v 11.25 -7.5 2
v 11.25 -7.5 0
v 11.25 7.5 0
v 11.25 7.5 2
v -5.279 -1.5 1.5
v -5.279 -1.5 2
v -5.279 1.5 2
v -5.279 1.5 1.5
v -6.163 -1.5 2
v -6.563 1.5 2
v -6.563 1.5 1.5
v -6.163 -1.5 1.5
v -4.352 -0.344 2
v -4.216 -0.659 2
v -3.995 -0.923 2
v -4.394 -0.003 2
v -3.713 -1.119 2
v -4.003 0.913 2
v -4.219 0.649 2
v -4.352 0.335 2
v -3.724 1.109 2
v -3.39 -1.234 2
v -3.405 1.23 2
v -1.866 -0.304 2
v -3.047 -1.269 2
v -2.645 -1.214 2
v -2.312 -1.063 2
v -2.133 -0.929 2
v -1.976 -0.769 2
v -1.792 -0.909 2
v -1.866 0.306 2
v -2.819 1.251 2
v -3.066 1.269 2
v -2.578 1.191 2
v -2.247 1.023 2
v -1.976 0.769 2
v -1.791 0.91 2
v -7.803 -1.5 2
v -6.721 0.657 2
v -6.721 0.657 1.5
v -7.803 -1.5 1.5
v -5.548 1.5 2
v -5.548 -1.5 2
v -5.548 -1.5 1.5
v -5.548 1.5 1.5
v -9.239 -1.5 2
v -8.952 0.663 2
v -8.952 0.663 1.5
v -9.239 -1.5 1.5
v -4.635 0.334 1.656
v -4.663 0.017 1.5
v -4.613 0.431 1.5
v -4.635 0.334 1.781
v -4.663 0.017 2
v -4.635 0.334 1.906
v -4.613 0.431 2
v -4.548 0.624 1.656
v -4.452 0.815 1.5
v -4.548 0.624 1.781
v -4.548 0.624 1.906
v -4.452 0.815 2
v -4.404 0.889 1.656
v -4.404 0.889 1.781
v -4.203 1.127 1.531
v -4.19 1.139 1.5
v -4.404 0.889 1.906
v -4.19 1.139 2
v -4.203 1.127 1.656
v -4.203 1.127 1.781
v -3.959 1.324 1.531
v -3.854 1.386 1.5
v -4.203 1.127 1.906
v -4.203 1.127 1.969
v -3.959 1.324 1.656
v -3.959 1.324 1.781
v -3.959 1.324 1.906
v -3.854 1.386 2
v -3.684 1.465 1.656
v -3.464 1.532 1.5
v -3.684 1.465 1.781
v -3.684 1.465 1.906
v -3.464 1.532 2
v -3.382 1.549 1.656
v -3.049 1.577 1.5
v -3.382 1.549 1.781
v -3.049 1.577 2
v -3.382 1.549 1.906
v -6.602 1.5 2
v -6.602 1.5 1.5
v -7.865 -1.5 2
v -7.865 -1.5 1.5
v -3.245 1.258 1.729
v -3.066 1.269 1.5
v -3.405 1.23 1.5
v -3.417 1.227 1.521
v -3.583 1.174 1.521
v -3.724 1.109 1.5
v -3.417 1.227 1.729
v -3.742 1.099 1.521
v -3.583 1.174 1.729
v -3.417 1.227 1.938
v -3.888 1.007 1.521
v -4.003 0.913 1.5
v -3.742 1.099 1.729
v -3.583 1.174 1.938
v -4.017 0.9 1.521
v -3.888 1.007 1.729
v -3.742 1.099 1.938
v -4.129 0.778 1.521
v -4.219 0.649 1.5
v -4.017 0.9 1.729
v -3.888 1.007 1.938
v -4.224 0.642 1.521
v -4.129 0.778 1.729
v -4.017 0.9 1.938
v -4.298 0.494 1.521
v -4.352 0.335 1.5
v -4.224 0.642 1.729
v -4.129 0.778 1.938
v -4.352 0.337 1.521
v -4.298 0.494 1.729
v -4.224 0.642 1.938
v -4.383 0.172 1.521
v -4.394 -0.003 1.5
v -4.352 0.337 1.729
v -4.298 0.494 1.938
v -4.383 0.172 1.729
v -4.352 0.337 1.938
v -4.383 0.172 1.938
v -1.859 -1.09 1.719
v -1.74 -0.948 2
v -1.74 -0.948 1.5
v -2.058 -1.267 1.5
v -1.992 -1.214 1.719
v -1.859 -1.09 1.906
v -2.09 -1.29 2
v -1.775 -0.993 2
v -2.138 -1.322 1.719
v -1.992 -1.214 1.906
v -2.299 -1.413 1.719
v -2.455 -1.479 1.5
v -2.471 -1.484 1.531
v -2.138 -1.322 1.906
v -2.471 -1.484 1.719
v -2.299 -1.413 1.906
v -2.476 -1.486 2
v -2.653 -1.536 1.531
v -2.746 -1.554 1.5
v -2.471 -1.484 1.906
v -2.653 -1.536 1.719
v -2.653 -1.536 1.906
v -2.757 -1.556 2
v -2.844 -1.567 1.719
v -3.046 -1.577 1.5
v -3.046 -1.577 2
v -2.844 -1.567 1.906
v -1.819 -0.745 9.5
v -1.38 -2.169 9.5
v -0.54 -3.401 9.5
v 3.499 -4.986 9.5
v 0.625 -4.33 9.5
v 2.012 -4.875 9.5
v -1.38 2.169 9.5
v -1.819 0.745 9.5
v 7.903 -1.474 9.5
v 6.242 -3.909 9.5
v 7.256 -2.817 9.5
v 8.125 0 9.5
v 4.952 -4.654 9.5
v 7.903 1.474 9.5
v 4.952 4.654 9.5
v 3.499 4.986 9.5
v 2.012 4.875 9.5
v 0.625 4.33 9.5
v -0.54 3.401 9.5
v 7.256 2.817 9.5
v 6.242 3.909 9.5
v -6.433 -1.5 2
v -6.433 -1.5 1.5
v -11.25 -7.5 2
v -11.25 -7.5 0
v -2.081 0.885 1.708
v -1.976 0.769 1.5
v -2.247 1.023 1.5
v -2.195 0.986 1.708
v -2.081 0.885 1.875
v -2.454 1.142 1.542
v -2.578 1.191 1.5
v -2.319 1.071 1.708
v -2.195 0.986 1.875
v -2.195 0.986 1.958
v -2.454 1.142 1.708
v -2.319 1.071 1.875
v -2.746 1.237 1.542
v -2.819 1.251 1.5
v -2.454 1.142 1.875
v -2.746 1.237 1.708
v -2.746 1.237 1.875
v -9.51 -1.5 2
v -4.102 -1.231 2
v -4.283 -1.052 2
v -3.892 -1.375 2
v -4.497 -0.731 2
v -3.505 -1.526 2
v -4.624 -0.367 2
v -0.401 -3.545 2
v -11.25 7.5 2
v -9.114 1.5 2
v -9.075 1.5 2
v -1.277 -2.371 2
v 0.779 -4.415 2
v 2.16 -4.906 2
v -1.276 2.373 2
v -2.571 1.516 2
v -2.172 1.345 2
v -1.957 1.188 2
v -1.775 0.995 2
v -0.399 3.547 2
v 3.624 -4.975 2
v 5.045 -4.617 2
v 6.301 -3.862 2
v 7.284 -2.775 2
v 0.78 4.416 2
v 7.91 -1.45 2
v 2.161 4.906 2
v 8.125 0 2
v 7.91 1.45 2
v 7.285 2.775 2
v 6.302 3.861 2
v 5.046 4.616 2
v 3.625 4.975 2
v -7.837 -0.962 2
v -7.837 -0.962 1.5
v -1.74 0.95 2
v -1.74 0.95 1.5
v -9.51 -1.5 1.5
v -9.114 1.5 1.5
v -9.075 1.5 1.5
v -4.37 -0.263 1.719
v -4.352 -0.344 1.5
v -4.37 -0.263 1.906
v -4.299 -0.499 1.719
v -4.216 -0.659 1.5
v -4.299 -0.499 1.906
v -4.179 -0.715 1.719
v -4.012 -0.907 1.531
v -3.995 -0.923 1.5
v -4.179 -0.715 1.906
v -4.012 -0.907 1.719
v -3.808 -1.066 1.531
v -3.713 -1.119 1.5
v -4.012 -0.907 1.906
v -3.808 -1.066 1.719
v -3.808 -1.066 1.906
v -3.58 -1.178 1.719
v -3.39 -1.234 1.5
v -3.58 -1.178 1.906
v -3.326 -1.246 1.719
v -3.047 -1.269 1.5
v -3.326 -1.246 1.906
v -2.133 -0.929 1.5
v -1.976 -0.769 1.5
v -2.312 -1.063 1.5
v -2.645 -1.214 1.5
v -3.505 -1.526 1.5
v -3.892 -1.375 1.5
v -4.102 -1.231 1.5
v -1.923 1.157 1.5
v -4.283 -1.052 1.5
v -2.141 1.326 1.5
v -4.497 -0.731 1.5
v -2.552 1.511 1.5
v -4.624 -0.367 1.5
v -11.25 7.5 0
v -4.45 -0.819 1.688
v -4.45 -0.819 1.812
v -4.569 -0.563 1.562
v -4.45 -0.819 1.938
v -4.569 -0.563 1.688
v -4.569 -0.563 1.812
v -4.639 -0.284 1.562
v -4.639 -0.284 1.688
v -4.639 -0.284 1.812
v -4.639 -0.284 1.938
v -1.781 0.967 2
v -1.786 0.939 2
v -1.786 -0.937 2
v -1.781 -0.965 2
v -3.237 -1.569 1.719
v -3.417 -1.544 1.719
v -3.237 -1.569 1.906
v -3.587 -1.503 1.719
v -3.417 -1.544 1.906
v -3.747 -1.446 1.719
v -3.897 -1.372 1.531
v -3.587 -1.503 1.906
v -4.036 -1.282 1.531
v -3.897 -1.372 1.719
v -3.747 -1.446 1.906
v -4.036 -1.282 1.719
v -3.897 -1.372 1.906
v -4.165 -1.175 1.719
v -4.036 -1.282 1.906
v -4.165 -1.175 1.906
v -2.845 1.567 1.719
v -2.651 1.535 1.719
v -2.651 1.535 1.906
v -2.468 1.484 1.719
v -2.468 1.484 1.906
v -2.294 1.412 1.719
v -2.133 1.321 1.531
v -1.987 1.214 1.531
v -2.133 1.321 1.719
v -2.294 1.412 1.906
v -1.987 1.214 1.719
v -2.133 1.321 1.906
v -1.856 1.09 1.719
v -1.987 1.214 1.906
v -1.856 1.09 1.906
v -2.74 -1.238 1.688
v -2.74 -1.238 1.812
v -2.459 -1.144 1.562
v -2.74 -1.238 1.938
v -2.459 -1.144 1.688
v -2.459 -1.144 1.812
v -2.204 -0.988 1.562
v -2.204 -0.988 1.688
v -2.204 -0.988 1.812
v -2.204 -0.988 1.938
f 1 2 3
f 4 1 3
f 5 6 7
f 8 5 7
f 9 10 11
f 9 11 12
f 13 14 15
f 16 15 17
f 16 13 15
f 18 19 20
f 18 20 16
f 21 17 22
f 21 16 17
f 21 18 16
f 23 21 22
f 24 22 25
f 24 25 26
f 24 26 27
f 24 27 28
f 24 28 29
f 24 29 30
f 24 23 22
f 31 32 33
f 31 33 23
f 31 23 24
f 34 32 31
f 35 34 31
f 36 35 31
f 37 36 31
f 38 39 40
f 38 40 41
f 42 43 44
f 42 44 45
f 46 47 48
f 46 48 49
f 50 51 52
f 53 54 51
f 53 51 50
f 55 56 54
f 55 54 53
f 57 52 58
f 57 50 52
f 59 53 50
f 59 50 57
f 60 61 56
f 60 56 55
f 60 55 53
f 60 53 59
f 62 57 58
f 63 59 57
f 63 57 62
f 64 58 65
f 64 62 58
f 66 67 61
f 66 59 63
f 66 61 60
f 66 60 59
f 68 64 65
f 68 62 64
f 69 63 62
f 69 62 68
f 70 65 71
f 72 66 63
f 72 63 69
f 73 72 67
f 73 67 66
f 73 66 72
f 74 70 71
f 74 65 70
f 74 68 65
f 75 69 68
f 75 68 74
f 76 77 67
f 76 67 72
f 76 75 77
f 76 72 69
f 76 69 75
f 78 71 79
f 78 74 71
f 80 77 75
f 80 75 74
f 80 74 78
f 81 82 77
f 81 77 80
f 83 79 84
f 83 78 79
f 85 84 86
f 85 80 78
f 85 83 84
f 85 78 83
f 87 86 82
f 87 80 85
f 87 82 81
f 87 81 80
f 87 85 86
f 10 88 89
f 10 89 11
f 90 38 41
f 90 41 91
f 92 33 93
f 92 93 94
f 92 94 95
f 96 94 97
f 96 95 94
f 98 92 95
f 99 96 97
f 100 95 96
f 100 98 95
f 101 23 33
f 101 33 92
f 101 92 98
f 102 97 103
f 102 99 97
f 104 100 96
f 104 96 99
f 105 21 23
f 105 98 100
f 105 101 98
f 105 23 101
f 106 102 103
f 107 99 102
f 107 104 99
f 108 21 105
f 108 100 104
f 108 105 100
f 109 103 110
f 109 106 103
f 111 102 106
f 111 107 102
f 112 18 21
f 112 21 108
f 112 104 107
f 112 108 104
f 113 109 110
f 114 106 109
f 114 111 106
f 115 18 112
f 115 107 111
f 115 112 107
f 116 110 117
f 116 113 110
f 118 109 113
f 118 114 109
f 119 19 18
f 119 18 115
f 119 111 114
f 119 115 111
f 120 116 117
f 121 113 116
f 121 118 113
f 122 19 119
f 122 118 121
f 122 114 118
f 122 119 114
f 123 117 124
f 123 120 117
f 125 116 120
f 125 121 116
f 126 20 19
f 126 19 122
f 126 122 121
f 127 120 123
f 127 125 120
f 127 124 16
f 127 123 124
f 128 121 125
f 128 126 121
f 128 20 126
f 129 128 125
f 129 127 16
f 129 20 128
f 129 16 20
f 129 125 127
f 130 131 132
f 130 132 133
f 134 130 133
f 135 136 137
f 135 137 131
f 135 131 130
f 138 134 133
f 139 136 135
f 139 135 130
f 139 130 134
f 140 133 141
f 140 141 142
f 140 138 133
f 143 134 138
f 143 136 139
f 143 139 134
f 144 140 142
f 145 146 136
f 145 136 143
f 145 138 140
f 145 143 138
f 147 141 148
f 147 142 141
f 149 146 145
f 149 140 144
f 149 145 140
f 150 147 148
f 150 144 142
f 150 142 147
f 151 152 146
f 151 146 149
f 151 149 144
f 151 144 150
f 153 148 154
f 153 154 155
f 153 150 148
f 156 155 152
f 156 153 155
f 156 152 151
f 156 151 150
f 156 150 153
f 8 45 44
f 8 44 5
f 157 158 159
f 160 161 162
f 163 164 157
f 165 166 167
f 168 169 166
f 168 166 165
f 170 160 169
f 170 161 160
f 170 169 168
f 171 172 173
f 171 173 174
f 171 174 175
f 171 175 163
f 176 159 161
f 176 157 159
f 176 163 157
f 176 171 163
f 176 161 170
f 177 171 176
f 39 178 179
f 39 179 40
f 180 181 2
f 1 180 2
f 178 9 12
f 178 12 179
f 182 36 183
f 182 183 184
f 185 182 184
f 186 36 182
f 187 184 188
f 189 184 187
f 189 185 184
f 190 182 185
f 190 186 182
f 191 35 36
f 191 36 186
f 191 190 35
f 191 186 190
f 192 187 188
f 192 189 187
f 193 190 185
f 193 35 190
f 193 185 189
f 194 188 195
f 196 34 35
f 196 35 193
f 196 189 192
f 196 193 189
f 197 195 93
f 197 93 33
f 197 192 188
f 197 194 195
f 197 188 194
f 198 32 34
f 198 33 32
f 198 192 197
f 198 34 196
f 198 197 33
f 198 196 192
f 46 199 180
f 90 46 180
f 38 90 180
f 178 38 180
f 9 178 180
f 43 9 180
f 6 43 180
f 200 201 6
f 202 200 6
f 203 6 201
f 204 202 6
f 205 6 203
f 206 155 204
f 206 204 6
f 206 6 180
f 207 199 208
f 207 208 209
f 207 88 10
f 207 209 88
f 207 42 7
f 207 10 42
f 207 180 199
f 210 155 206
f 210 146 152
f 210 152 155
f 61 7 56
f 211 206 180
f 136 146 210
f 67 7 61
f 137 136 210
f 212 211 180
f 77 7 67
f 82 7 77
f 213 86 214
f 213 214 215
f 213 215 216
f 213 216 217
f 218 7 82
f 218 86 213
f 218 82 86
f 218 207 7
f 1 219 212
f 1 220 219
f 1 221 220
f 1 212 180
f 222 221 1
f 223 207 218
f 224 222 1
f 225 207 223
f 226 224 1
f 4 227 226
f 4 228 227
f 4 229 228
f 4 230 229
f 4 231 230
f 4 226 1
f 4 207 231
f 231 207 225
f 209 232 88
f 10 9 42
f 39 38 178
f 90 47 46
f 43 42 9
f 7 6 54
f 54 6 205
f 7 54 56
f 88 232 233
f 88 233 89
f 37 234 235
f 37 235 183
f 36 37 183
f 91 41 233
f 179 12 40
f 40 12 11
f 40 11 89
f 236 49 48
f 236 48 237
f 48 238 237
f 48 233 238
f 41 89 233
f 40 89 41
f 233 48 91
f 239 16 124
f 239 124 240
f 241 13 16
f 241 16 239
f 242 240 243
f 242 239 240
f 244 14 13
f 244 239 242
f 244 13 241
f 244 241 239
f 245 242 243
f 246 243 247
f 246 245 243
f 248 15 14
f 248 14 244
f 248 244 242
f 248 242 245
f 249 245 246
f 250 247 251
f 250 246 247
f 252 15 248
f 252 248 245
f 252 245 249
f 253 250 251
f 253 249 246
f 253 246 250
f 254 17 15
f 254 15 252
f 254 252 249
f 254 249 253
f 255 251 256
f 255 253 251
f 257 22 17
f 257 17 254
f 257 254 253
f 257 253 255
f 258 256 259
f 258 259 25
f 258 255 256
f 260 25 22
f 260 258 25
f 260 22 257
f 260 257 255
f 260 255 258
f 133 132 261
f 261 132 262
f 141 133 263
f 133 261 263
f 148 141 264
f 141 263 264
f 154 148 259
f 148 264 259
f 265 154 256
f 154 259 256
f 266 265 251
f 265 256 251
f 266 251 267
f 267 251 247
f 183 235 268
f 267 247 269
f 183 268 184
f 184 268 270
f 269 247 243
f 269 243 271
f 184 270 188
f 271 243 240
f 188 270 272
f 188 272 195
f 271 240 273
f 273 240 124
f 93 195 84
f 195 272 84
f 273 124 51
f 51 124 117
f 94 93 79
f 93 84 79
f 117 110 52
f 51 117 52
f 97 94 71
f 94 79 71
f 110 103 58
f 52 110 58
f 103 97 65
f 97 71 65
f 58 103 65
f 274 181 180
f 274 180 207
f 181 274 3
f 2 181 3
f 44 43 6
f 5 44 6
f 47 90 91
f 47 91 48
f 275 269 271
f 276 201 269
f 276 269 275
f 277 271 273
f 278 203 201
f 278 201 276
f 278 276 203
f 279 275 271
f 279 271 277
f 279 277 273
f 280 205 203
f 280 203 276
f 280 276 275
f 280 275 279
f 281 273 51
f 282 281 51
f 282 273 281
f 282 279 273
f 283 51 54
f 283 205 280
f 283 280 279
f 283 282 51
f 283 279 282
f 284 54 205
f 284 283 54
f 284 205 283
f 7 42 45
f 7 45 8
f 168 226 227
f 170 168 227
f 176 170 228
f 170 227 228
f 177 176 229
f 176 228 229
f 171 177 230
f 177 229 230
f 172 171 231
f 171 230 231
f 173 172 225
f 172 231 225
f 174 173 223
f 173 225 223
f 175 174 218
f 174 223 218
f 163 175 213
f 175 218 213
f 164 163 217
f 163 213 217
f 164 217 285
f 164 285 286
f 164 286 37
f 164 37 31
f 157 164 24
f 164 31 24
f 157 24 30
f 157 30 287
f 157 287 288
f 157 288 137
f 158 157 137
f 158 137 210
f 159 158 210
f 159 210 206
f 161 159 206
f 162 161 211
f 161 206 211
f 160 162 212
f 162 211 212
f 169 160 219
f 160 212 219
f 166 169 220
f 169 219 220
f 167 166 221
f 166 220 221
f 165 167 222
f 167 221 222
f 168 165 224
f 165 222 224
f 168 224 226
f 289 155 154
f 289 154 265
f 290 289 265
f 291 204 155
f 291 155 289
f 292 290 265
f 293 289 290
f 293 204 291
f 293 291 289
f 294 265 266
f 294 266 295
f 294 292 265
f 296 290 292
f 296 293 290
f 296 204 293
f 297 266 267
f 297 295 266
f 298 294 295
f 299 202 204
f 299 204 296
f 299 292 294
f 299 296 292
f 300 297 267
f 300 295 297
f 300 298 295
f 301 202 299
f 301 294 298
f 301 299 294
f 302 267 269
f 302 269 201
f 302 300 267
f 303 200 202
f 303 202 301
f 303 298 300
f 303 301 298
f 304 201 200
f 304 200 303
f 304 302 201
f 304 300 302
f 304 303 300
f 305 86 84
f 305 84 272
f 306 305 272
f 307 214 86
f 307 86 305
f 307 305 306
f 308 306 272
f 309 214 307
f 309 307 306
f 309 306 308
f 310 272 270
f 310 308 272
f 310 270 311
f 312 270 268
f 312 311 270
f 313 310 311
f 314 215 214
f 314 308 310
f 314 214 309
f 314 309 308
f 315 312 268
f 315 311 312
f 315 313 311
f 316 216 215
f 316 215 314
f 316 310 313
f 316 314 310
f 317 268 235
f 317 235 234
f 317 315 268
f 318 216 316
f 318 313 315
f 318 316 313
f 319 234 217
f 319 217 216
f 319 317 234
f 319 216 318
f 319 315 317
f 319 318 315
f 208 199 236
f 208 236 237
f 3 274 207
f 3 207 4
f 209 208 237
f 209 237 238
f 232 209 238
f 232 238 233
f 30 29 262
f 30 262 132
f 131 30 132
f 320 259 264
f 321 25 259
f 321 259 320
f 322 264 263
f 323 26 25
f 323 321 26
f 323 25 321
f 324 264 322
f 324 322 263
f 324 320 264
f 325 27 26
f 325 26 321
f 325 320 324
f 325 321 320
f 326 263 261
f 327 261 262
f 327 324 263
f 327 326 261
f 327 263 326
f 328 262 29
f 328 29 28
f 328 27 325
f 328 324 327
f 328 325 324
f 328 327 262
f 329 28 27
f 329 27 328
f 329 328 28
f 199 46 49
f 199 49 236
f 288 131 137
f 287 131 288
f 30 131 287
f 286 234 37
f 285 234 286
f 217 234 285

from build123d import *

# Parameters (mm, degrees)
SKETCH1_W           = 22.5
SKETCH1_H           = 15
BOSS_EXTRUDE1_DEPTH = 2
SKETCH2_R           = 5
BOSS_EXTRUDE2_DEPTH = 7.5
SKETCH3_W           = 0.269230769
SKETCH3_H           = 3
CUT_EXTRUDE1_DEPTH  = 0.5


with BuildPart() as part:
    # Sketch1 → Boss-Extrude1 (new body)
    with BuildSketch(Plane.XY):
        Rectangle(SKETCH1_W, SKETCH1_H)
    extrude(amount=BOSS_EXTRUDE1_DEPTH)

    # Sketch2 → Boss-Extrude2 (add)
    with BuildSketch(Plane.XY.offset(2)):
        with Locations((3.125, 0)):
            Circle(SKETCH2_R)
    extrude(amount=BOSS_EXTRUDE2_DEPTH)

    # Sketch3 → Cut-Extrude1 (cut)
    with BuildSketch(Plane.XY.offset(2)):
        Polygon((-9.509615385, -1.5), (-9.113581731, 1.5), (-9.075120192, 1.5), (-7.836538462, -0.961538462), (-6.6015625, 1.5), (-6.563100962, 1.5), (-6.163461538, -1.5), (-6.432692308, -1.5), (-6.721153846, 0.656850962), (-7.803485577, -1.5), (-7.864783654, -1.5), (-8.951923077, 0.663461538), (-9.238581731, -1.5), align=None)
        with Locations((-5.413461539, 0)):
            Rectangle(SKETCH3_W, SKETCH3_H)
        with BuildLine():
            Line((-1.740384615, 0.949519231), (-1.975961538, 0.769230769))
            add(Edge.make_bspline(
                [(-1.975961538, 0.769230769), (-1.992766586, 0.789258743), (-2.026150111, 0.829044671), (-2.079857999, 0.884912852), (-2.135830836, 0.937254505), (-2.194047226, 0.986318973), (-2.255555042, 1.030390487), (-2.318864298, 1.071765718), (-2.385034051, 1.10885235), (-2.476535538, 1.153820624), (-2.596233694, 1.2007459), (-2.746914985, 1.240091526), (-2.904210212, 1.265138248), (-3.01152244, 1.26785097), (-3.066105769, 1.269230769)],
                knots=[0, 0, 0, 0, 0.757959112, 1.505699292, 2.245454638, 2.979532153, 3.711538275, 4.438200793, 5.171680507, 5.909471876, 7.393775596, 8.890124382, 10.418191784, 12, 12, 12, 12], degree=3))
            add(Edge.make_bspline(
                [(-3.066105769, 1.269230769), (-3.096177169, 1.268884516), (-3.156040877, 1.268195222), (-3.244882425, 1.259101686), (-3.332065041, 1.246320649), (-3.417532012, 1.227356086), (-3.501174547, 1.203379556), (-3.583539464, 1.174729201), (-3.663434263, 1.139282195), (-3.741964182, 1.100103687), (-3.817203506, 1.055851591), (-3.888393547, 1.007583004), (-3.955274662, 0.955838064), (-4.017899758, 0.90042283), (-4.076332857, 0.841586864), (-4.130150552, 0.778703143), (-4.179166617, 0.711972708), (-4.224352639, 0.642275502), (-4.264820696, 0.569814537), (-4.29870345, 0.49432162), (-4.32870784, 0.417089531), (-4.352450048, 0.337245679), (-4.371242491, 0.25535188), (-4.38420906, 0.171188348), (-4.393199178, 0.084930908), (-4.393885044, 0.026465783), (-4.394230769, -0.003004808)],
                knots=[0, 0, 0, 0, 1.054917814, 2.100044995, 3.131103042, 4.146048494, 5.169673617, 6.183595914, 7.203665975, 8.234915748, 9.262203917, 10.264457458, 11.251630812, 12.227803204, 13.197192746, 14.159520551, 15.12972552, 16.100847026, 17.073214652, 18.039054194, 19.002613845, 19.979014051, 20.95965708, 21.949030935, 22.966165397, 24, 24, 24, 24], degree=3))
            add(Edge.make_bspline(
                [(-4.394230769, -0.003004808), (-4.39314921, -0.047345939), (-4.391025712, -0.134403869), (-4.37212714, -0.261921535), (-4.34340849, -0.384082113), (-4.300366567, -0.500121977), (-4.247293095, -0.611471999), (-4.180229714, -0.716248159), (-4.102558396, -0.816033785), (-4.013180323, -0.908470598), (-3.915118195, -0.992910934), (-3.809905699, -1.067268575), (-3.697804881, -1.12925276), (-3.580053483, -1.180832143), (-3.455745386, -1.220480766), (-3.325104127, -1.248392872), (-3.188413845, -1.266600456), (-3.095011502, -1.268343617), (-3.047475962, -1.269230769)],
                knots=[0, 0, 0, 0, 1.029171465, 2.020641659, 2.987623507, 3.938342917, 4.889210282, 5.84687017, 6.821220943, 7.821438502, 8.827599549, 9.822697543, 10.807740252, 11.797342354, 12.80366471, 13.83203677, 14.896651826, 16, 16, 16, 16], degree=3))
            add(Edge.make_bspline(
                [(-3.047475962, -1.269230769), (-2.995102228, -1.267783244), (-2.892018192, -1.264934167), (-2.740845598, -1.240797668), (-2.596129227, -1.20166231), (-2.457861296, -1.146892662), (-2.326431599, -1.075693844), (-2.201634462, -0.989381378), (-2.083364544, -0.887134235), (-2.012246302, -0.809062982), (-1.975961538, -0.769230769)],
                knots=[0, 0, 0, 0, 1.028121516, 2.023589091, 2.998037872, 3.967518031, 4.937445131, 5.927275754, 6.942489185, 8, 8, 8, 8], degree=3))
            Line((-1.975961538, -0.769230769), (-1.740384615, -0.947716346))
            add(Edge.make_bspline(
                [(-1.740384615, -0.947716346), (-1.759342995, -0.972177876), (-1.797168946, -1.020983767), (-1.858418674, -1.08978809), (-1.922942072, -1.154505835), (-1.991218395, -1.214615224), (-2.062462216, -1.271319052), (-2.13795277, -1.323006336), (-2.216697655, -1.370398523), (-2.298430065, -1.413793029), (-2.383063162, -1.452293527), (-2.470495535, -1.485253899), (-2.560350314, -1.513646662), (-2.652631607, -1.537005464), (-2.747530827, -1.555237822), (-2.844705519, -1.567426115), (-2.944365412, -1.575776327), (-3.011600916, -1.576537398), (-3.045673077, -1.576923077)],
                knots=[0, 0, 0, 0, 0.986787822, 1.968848986, 2.935600012, 3.899624008, 4.868462664, 5.837806735, 6.815139263, 7.798259679, 8.787526145, 9.778297419, 10.776456485, 11.791383307, 12.812564526, 13.85620153, 14.913611965, 16, 16, 16, 16], degree=3))
            add(Edge.make_bspline(
                [(-3.045673077, -1.576923077), (-3.077939077, -1.576698512), (-3.141741097, -1.576254462), (-3.235940027, -1.569061176), (-3.327645382, -1.559247116), (-3.416595062, -1.544469861), (-3.503274469, -1.527031855), (-3.586897827, -1.503656492), (-3.668288007, -1.477471492), (-3.747118014, -1.446695789), (-3.823454899, -1.411967633), (-3.897052452, -1.372717725), (-3.967876822, -1.329276127), (-4.036624326, -1.282600404), (-4.102279398, -1.231191288), (-4.165410991, -1.175762744), (-4.226373113, -1.116501592), (-4.2640897, -1.07376886), (-4.283052885, -1.052283654)],
                knots=[0, 0, 0, 0, 1.114604814, 2.203992996, 3.262667896, 4.300477797, 5.318619304, 6.316056647, 7.298880507, 8.271930387, 9.238335007, 10.195173496, 11.151986948, 12.108099108, 13.064862484, 14.031167946, 15.010108607, 16, 16, 16, 16], degree=3))
            add(Edge.make_bspline(
                [(-4.283052885, -1.052283654), (-4.313426293, -1.014962635), (-4.373806416, -0.940771169), (-4.451057002, -0.820526042), (-4.517183478, -0.694981863), (-4.570648553, -0.563479067), (-4.612445181, -0.426312735), (-4.641400492, -0.283413723), (-4.660216153, -0.134915486), (-4.662367829, -0.033912525), (-4.663461538, 0.017427885)],
                knots=[0, 0, 0, 0, 0.994628077, 1.977248131, 2.950237994, 3.925870899, 4.908910175, 5.911660606, 6.938484602, 8, 8, 8, 8], degree=3))
            add(Edge.make_bspline(
                [(-4.663461538, 0.017427885), (-4.662128515, 0.071389702), (-4.659505876, 0.177556209), (-4.637223765, 0.333362454), (-4.601379083, 0.482635082), (-4.550467464, 0.625095434), (-4.48592002, 0.761492818), (-4.406182923, 0.890785279), (-4.312182515, 1.013799679), (-4.204656028, 1.128669465), (-4.08674117, 1.233703196), (-3.960467901, 1.326108514), (-3.826083375, 1.403009242), (-3.685068073, 1.467291667), (-3.53636606, 1.516701206), (-3.380294601, 1.551289652), (-3.21714696, 1.572818609), (-3.105836309, 1.575540216), (-3.049278846, 1.576923077)],
                knots=[0, 0, 0, 0, 1.032925535, 2.032216505, 3.007276963, 3.968222605, 4.92396291, 5.891752235, 6.871517503, 7.883894988, 8.900124299, 9.891468569, 10.874487609, 11.85992873, 12.854644235, 13.869047385, 14.917252991, 16, 16, 16, 16], degree=3))
            add(Edge.make_bspline(
                [(-3.049278846, 1.576923077), (-3.014809299, 1.576509816), (-2.946580301, 1.575691806), (-2.845649456, 1.567715113), (-2.747384604, 1.554417736), (-2.651718048, 1.536318248), (-2.558184377, 1.51385483), (-2.467498457, 1.484591717), (-2.379128154, 1.451131833), (-2.293630804, 1.412596005), (-2.211416618, 1.369338798), (-2.132511202, 1.321839692), (-2.057541323, 1.270157573), (-1.985979453, 1.214731994), (-1.919022701, 1.154390372), (-1.854770005, 1.090792432), (-1.795403366, 1.022106297), (-1.758757771, 0.973759211), (-1.740384615, 0.949519231)],
                knots=[0, 0, 0, 0, 1.096760587, 2.17092713, 3.219439832, 4.250915756, 5.268269357, 6.278326846, 7.281116186, 8.274029601, 9.260640565, 10.235837813, 11.203064059, 12.156899882, 13.114053108, 14.069676657, 15.032185724, 16, 16, 16, 16], degree=3))
        make_face()
    extrude(amount=-CUT_EXTRUDE1_DEPTH, mode=Mode.SUBTRACT)


solid = part.part
